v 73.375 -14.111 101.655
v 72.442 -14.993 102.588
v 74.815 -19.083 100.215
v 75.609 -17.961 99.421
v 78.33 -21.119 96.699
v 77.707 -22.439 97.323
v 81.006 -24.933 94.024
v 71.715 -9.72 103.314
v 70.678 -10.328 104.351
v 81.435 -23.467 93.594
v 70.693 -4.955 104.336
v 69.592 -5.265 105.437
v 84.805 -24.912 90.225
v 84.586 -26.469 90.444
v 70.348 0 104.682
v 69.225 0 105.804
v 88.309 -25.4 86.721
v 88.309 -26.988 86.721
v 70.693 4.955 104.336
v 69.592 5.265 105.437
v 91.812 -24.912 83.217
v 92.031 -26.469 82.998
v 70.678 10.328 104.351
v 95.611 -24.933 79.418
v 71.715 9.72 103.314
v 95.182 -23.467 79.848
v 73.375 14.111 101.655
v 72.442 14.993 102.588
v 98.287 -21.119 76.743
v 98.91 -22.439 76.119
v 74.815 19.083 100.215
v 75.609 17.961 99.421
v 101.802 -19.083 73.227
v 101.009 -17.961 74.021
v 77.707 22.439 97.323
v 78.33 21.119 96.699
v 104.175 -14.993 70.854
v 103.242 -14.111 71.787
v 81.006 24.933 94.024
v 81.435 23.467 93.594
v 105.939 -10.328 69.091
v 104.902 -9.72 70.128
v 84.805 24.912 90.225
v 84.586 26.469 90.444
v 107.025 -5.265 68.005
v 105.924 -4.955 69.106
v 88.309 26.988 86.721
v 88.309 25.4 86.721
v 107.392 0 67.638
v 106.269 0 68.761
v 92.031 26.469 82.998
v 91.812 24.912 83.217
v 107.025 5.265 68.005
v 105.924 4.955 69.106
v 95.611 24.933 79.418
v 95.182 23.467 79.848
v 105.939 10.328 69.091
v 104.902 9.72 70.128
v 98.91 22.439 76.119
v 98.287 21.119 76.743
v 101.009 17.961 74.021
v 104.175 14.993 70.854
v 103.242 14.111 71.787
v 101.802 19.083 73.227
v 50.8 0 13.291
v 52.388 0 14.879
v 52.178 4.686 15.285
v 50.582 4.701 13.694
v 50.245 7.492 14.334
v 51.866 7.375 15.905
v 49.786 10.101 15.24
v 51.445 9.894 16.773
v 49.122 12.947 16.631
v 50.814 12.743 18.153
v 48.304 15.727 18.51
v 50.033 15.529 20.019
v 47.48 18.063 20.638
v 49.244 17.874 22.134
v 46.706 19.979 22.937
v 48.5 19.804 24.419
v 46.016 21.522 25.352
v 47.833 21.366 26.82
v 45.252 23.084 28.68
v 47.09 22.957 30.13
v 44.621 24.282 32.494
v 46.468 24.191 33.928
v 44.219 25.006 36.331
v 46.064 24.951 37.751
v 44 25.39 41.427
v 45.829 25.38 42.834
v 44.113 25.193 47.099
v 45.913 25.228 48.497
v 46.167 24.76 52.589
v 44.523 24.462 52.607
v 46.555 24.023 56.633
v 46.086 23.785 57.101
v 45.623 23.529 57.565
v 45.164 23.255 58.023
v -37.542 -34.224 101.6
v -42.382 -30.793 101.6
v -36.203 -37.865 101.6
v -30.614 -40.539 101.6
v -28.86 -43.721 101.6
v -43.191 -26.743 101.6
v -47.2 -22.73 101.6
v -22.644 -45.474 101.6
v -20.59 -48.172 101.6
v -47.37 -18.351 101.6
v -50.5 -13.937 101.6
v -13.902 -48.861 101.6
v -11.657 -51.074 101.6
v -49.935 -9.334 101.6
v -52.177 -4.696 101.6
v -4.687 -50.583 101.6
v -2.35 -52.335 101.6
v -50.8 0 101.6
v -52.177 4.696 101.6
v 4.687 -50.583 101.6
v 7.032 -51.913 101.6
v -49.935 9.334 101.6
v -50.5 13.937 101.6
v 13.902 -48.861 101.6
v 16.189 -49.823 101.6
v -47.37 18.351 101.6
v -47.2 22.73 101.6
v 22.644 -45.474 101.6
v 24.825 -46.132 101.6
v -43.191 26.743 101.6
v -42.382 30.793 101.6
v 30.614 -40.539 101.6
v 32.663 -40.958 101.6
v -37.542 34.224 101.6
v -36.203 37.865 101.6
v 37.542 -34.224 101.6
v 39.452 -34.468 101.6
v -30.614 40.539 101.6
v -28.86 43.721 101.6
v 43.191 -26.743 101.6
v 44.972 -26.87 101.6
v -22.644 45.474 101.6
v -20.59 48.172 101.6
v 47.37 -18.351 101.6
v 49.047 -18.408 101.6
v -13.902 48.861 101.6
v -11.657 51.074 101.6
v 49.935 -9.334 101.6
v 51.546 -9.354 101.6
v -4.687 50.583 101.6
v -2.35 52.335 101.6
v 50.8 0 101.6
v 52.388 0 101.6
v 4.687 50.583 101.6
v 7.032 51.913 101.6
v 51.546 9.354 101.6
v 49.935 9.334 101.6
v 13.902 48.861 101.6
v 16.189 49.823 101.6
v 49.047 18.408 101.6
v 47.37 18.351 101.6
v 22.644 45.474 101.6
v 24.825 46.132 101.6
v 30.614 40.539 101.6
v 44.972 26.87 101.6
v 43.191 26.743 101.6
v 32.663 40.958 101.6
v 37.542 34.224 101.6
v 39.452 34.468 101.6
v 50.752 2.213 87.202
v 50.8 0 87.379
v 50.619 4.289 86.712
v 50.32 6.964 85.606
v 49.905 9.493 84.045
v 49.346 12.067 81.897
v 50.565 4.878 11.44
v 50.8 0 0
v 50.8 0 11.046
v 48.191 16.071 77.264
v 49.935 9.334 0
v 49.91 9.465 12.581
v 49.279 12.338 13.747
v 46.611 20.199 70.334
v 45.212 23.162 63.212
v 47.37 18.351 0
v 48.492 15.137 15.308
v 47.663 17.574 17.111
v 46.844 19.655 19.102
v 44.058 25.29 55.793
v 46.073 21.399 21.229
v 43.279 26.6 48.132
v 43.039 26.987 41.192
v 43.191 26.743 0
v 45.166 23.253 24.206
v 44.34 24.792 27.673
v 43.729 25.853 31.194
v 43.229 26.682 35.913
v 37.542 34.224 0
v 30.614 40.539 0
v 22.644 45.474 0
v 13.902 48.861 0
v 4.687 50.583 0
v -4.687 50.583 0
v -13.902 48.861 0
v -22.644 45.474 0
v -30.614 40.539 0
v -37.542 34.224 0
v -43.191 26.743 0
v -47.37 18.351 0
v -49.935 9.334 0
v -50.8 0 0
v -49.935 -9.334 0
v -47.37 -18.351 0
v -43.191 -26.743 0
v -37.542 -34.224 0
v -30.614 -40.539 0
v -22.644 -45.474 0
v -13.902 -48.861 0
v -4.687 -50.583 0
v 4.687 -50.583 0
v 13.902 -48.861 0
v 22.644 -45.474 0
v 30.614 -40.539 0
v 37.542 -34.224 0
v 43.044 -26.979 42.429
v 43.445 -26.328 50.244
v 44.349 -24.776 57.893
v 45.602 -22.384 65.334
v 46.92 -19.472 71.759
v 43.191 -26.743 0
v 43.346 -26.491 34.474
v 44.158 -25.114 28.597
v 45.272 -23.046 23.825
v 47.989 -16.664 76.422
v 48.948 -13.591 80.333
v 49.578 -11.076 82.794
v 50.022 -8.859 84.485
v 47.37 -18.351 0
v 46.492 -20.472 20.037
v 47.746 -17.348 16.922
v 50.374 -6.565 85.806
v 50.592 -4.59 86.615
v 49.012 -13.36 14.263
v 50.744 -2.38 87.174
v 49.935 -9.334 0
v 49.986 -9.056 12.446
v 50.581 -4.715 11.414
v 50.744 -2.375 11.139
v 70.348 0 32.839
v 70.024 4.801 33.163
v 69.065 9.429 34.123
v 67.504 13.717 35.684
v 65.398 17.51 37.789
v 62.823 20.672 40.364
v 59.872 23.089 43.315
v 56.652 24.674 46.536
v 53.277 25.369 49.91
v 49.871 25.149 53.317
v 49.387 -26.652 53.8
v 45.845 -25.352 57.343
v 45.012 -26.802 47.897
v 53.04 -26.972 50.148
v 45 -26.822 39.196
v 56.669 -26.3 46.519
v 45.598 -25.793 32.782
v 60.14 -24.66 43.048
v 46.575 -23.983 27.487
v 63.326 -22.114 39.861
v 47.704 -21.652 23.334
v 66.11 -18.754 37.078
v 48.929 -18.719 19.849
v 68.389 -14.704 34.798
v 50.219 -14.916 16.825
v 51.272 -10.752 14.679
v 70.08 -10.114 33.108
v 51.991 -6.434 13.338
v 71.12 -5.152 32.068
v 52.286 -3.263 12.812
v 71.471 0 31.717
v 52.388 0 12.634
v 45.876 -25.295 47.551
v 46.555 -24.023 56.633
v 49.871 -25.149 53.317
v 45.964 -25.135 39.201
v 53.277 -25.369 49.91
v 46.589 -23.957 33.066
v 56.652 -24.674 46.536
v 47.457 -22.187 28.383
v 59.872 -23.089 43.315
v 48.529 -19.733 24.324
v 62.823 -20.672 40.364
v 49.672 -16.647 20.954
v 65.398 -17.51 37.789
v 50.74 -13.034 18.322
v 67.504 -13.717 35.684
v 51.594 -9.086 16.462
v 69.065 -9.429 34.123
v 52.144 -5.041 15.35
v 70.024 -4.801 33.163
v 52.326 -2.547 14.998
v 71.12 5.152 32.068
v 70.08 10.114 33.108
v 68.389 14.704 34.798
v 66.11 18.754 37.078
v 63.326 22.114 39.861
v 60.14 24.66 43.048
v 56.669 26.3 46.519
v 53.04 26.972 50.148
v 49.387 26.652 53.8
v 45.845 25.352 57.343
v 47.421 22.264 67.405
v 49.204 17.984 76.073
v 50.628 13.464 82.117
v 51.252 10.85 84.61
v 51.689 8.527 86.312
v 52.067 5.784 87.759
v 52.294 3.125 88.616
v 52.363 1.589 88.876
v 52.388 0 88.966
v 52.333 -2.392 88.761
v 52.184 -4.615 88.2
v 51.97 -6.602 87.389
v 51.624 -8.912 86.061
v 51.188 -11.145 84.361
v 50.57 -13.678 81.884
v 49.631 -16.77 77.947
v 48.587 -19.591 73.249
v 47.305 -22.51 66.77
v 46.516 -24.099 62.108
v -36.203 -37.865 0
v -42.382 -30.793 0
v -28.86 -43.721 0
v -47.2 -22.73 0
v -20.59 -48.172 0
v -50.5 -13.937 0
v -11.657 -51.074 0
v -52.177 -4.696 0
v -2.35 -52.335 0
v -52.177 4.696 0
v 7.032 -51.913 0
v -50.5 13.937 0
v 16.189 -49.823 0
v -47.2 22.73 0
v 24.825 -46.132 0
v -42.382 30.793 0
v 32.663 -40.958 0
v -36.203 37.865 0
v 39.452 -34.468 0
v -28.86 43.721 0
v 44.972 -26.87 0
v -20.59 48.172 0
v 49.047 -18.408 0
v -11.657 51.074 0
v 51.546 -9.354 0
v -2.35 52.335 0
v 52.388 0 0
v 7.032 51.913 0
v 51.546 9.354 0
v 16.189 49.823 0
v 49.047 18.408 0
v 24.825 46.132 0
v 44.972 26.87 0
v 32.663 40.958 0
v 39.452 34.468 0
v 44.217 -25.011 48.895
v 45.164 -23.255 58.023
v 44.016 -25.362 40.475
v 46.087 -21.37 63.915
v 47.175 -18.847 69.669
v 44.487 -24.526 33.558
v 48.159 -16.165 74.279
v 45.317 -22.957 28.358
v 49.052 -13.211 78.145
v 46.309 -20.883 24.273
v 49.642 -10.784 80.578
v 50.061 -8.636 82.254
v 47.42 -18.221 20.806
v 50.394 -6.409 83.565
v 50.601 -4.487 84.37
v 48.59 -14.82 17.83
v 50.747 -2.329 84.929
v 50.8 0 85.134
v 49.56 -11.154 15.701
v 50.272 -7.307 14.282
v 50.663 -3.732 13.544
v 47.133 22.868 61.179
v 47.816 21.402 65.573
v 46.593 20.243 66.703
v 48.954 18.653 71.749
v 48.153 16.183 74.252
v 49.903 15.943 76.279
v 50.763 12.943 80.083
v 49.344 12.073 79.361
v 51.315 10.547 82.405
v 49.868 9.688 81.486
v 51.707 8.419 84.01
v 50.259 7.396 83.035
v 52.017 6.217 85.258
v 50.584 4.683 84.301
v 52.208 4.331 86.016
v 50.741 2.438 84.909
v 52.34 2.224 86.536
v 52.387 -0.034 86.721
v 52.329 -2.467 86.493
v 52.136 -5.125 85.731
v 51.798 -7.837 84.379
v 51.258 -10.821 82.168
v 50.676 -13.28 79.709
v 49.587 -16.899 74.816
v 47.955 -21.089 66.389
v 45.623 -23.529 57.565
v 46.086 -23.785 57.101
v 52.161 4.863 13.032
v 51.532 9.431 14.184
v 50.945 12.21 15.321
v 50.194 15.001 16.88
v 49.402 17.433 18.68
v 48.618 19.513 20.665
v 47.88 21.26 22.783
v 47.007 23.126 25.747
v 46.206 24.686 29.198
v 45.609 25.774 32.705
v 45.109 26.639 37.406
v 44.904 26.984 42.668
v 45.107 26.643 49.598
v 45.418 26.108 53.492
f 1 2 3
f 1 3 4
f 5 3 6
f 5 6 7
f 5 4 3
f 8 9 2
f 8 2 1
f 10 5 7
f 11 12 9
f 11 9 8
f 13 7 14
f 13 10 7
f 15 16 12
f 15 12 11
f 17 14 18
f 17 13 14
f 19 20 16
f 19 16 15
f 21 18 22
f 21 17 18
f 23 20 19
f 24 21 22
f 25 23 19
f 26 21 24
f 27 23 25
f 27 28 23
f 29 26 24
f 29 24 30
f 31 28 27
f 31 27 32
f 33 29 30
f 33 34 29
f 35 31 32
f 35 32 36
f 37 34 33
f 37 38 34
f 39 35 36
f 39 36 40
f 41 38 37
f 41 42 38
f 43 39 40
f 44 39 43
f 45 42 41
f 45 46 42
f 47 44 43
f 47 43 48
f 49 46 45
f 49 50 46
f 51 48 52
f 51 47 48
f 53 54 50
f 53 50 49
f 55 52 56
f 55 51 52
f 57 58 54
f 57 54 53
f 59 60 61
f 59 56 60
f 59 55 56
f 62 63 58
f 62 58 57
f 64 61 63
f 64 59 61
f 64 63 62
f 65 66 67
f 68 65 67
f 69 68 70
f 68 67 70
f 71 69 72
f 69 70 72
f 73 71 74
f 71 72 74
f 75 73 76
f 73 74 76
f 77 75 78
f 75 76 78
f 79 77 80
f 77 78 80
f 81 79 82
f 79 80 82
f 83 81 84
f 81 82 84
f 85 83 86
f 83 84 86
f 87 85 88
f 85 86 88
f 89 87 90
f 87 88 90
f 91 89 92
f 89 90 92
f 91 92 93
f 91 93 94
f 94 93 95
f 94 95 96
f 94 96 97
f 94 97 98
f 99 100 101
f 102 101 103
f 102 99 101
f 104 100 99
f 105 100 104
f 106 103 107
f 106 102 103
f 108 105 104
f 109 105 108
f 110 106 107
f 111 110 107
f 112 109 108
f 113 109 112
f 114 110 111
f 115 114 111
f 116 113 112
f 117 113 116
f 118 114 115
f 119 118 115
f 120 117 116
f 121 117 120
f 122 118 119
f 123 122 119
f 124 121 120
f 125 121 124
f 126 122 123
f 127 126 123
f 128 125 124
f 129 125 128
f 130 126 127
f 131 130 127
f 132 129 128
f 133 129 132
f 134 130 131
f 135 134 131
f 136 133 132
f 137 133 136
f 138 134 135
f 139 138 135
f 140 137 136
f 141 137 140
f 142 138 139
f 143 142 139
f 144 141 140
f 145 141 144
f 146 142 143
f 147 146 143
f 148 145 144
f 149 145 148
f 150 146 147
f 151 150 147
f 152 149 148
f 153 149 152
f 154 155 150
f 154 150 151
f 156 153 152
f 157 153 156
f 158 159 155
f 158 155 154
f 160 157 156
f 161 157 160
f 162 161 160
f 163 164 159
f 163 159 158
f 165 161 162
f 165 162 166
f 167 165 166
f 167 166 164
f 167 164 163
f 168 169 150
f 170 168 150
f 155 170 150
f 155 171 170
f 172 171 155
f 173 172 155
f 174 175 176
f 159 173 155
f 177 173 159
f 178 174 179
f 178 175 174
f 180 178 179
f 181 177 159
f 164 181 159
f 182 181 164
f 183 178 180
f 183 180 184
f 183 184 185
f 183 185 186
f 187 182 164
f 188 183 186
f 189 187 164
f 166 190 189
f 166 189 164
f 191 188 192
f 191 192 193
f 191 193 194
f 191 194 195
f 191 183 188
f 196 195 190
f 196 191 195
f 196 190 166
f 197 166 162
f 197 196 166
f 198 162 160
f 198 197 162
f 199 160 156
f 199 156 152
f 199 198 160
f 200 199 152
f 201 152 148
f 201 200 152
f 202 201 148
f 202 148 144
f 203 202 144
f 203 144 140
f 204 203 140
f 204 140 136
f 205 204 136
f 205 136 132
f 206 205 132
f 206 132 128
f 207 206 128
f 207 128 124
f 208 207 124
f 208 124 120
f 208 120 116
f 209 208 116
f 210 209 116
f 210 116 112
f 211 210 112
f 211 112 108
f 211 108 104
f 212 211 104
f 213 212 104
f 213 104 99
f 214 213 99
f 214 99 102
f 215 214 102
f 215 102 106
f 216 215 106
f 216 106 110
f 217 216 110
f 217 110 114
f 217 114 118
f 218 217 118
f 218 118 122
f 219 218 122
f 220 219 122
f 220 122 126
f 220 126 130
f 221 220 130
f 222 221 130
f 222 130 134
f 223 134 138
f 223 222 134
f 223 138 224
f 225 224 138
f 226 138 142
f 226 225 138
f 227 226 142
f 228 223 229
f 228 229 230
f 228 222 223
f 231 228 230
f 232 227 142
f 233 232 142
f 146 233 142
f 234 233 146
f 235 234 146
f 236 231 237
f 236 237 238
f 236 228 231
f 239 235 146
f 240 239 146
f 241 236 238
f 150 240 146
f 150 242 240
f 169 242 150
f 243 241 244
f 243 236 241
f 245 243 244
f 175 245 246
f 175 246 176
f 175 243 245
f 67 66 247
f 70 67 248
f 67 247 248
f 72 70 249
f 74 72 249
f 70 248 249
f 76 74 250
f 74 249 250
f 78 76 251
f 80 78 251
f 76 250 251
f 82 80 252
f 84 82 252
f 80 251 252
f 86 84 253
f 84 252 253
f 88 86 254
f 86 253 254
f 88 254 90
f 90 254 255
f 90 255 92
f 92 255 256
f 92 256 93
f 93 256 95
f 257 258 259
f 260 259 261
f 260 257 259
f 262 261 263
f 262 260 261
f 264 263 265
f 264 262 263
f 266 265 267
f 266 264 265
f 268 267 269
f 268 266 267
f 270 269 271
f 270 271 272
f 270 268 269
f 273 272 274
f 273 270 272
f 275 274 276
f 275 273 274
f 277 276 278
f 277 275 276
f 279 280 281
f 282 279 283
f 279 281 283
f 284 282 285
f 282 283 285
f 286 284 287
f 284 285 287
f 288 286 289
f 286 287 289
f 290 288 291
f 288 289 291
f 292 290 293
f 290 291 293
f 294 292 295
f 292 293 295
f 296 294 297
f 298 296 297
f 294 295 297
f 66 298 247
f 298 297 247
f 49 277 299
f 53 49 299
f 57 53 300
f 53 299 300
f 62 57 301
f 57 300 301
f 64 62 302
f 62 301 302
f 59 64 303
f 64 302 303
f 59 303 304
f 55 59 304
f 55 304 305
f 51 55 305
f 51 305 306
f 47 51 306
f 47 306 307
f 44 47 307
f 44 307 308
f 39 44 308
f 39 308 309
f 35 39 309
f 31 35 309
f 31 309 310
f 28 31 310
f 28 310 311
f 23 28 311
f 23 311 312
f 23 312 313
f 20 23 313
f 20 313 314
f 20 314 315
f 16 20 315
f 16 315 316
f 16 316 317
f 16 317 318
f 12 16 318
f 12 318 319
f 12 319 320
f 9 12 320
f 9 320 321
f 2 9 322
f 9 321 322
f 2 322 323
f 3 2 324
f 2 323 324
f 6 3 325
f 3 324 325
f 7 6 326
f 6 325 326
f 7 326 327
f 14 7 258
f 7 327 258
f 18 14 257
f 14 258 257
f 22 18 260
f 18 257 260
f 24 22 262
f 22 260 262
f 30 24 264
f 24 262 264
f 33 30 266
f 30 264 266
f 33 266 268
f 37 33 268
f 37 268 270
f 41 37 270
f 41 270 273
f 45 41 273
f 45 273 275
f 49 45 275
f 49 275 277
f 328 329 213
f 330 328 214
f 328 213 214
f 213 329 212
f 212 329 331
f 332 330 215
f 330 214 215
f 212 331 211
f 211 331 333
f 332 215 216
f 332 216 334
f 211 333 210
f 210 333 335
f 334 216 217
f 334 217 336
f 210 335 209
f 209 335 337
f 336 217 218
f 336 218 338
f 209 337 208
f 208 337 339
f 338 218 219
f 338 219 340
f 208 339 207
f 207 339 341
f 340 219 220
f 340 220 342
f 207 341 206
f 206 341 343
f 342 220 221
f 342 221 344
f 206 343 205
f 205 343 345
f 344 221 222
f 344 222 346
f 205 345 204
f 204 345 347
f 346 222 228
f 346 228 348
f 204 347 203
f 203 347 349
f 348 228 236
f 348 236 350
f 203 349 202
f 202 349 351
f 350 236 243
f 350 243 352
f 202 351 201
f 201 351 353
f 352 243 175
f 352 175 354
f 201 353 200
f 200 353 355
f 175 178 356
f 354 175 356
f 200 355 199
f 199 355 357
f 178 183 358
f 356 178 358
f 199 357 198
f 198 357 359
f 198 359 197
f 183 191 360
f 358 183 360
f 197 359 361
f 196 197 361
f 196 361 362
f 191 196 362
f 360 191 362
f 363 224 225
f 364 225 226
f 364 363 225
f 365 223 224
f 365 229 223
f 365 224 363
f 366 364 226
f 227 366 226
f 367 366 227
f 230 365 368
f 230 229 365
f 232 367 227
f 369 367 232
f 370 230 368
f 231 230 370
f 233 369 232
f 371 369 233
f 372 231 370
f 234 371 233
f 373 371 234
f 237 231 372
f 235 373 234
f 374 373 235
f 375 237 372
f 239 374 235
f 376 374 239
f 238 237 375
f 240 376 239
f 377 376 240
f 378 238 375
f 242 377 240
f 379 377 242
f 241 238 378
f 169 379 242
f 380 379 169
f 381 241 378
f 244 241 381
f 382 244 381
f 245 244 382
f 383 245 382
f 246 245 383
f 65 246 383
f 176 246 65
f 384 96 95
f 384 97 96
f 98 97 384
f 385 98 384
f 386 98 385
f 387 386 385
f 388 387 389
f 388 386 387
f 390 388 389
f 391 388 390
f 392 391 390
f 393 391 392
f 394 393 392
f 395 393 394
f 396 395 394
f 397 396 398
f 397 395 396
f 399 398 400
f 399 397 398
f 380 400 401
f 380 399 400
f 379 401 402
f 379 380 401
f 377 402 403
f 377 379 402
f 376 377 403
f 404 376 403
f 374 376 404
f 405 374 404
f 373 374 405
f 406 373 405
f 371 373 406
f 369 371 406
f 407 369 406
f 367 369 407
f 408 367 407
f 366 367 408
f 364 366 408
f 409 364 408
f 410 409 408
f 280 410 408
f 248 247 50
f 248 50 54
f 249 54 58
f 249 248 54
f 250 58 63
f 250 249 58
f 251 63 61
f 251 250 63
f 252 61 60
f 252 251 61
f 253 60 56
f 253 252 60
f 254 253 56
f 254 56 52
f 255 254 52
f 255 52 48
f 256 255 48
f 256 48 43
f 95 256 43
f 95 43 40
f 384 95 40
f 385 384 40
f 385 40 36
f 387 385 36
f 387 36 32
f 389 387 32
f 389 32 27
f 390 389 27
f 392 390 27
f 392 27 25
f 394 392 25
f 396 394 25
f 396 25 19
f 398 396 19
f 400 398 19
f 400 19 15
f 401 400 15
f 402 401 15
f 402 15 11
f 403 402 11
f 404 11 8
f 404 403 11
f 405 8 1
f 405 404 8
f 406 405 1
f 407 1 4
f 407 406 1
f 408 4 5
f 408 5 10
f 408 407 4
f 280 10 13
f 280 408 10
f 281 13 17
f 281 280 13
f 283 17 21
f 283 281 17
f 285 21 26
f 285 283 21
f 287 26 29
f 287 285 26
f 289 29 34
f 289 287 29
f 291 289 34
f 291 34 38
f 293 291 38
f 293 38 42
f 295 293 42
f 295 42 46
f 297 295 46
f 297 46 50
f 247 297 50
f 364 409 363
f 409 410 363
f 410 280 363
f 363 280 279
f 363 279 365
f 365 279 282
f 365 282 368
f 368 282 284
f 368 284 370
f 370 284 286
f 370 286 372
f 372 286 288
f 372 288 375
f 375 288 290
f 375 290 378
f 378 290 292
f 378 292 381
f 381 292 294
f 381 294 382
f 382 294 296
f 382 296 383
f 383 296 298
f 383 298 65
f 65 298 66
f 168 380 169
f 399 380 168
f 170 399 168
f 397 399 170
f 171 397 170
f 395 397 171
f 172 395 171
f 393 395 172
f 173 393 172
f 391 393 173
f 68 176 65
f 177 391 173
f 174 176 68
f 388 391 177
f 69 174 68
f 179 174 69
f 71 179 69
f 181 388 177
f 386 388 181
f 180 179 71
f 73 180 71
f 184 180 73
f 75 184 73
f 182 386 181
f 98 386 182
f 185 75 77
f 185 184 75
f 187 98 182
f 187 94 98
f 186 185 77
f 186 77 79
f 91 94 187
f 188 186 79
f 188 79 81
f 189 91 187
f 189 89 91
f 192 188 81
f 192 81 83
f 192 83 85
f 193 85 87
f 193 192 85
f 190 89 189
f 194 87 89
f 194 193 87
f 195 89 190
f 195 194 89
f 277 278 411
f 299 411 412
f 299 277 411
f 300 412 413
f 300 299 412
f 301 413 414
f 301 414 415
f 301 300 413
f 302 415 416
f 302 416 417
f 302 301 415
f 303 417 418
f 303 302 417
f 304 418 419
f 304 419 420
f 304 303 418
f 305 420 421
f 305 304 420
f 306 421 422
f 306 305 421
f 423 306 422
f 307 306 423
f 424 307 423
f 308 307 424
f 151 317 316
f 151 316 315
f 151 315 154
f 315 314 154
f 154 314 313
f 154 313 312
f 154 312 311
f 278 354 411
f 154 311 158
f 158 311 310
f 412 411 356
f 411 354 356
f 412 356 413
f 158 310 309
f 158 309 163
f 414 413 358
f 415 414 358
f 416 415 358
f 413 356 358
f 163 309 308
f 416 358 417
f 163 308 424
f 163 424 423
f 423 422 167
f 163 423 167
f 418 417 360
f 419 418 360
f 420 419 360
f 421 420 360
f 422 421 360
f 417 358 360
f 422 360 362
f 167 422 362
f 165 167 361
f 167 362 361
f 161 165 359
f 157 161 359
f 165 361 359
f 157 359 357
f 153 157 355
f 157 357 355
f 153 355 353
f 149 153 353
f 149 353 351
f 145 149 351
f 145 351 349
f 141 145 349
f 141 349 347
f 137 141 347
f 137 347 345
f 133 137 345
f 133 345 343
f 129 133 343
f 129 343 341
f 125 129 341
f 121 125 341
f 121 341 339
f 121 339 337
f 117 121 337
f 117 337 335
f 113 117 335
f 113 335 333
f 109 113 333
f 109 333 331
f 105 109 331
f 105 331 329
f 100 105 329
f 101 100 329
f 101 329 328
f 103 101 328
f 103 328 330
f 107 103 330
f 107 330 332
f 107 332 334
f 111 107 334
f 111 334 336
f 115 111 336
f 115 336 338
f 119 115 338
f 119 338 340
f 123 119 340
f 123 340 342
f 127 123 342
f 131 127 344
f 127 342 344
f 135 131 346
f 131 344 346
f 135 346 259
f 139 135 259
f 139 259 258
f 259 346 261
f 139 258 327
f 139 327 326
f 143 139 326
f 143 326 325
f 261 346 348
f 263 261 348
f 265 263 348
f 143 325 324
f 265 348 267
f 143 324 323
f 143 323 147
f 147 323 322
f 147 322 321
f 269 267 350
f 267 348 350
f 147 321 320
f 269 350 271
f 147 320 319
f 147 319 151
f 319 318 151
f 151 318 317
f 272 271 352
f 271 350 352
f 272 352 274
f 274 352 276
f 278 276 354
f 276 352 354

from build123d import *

# Parameters (mm, degrees)
F0_R          = 52.3875
F0_R_2        = 50.8
F1_DEPTH      = 101.6
F5_R          = 26.9875
F5_R_2        = 25.4
F6_DEPTH      = 50.8
F6_DEPTH_BACK = 50.8
F7_DEPTH      = 105.8050688415
F7_DEPTH_BACK = 4.2050688415
F8_DEPTH      = 50.8
F8_DEPTH_BACK = 77.7885001414


with BuildPart() as f1:
    # F0 (on Top) → F1 (new body)
    with BuildSketch(Plane.XY):
        Circle(F0_R)
        Circle(F0_R_2, mode=Mode.SUBTRACT)
    extrude(amount=F1_DEPTH)

    # F5 (on line) → F6 (join, two sides)
    with BuildSketch(Plane(origin=(51.59375, 0, 51.59375), x_dir=(0.7071067812, 0, -0.7071067812), z_dir=(0.7071067812, 0, 0.7071067812))) as f6_sk:
        with Locations((1.1225320151, 0)):
            Circle(F5_R)
        with Locations((1.1225320151, 0)):
            Circle(F5_R_2, mode=Mode.SUBTRACT)
    extrude(amount=F6_DEPTH)
    extrude(f6_sk.sketch, amount=-F6_DEPTH_BACK)

    # F0 (on Top) → F7 (cut, two sides)
    with BuildSketch(Plane.XY) as f7_sk:
        Circle(F0_R_2)
    extrude(amount=F7_DEPTH, mode=Mode.SUBTRACT)
    extrude(f7_sk.sketch, amount=-F7_DEPTH_BACK, mode=Mode.SUBTRACT)

    # F5 (on line) → F8 (cut, two sides)
    with BuildSketch(Plane(origin=(51.59375, 0, 51.59375), x_dir=(0.7071067812, 0, -0.7071067812), z_dir=(0.7071067812, 0, 0.7071067812))) as f8_sk:
        with Locations((1.1225320151, 0)):
            Circle(F5_R_2)
    extrude(amount=-F8_DEPTH, mode=Mode.SUBTRACT)
    extrude(f8_sk.sketch, amount=F8_DEPTH_BACK, mode=Mode.SUBTRACT)


solid = f1.part
